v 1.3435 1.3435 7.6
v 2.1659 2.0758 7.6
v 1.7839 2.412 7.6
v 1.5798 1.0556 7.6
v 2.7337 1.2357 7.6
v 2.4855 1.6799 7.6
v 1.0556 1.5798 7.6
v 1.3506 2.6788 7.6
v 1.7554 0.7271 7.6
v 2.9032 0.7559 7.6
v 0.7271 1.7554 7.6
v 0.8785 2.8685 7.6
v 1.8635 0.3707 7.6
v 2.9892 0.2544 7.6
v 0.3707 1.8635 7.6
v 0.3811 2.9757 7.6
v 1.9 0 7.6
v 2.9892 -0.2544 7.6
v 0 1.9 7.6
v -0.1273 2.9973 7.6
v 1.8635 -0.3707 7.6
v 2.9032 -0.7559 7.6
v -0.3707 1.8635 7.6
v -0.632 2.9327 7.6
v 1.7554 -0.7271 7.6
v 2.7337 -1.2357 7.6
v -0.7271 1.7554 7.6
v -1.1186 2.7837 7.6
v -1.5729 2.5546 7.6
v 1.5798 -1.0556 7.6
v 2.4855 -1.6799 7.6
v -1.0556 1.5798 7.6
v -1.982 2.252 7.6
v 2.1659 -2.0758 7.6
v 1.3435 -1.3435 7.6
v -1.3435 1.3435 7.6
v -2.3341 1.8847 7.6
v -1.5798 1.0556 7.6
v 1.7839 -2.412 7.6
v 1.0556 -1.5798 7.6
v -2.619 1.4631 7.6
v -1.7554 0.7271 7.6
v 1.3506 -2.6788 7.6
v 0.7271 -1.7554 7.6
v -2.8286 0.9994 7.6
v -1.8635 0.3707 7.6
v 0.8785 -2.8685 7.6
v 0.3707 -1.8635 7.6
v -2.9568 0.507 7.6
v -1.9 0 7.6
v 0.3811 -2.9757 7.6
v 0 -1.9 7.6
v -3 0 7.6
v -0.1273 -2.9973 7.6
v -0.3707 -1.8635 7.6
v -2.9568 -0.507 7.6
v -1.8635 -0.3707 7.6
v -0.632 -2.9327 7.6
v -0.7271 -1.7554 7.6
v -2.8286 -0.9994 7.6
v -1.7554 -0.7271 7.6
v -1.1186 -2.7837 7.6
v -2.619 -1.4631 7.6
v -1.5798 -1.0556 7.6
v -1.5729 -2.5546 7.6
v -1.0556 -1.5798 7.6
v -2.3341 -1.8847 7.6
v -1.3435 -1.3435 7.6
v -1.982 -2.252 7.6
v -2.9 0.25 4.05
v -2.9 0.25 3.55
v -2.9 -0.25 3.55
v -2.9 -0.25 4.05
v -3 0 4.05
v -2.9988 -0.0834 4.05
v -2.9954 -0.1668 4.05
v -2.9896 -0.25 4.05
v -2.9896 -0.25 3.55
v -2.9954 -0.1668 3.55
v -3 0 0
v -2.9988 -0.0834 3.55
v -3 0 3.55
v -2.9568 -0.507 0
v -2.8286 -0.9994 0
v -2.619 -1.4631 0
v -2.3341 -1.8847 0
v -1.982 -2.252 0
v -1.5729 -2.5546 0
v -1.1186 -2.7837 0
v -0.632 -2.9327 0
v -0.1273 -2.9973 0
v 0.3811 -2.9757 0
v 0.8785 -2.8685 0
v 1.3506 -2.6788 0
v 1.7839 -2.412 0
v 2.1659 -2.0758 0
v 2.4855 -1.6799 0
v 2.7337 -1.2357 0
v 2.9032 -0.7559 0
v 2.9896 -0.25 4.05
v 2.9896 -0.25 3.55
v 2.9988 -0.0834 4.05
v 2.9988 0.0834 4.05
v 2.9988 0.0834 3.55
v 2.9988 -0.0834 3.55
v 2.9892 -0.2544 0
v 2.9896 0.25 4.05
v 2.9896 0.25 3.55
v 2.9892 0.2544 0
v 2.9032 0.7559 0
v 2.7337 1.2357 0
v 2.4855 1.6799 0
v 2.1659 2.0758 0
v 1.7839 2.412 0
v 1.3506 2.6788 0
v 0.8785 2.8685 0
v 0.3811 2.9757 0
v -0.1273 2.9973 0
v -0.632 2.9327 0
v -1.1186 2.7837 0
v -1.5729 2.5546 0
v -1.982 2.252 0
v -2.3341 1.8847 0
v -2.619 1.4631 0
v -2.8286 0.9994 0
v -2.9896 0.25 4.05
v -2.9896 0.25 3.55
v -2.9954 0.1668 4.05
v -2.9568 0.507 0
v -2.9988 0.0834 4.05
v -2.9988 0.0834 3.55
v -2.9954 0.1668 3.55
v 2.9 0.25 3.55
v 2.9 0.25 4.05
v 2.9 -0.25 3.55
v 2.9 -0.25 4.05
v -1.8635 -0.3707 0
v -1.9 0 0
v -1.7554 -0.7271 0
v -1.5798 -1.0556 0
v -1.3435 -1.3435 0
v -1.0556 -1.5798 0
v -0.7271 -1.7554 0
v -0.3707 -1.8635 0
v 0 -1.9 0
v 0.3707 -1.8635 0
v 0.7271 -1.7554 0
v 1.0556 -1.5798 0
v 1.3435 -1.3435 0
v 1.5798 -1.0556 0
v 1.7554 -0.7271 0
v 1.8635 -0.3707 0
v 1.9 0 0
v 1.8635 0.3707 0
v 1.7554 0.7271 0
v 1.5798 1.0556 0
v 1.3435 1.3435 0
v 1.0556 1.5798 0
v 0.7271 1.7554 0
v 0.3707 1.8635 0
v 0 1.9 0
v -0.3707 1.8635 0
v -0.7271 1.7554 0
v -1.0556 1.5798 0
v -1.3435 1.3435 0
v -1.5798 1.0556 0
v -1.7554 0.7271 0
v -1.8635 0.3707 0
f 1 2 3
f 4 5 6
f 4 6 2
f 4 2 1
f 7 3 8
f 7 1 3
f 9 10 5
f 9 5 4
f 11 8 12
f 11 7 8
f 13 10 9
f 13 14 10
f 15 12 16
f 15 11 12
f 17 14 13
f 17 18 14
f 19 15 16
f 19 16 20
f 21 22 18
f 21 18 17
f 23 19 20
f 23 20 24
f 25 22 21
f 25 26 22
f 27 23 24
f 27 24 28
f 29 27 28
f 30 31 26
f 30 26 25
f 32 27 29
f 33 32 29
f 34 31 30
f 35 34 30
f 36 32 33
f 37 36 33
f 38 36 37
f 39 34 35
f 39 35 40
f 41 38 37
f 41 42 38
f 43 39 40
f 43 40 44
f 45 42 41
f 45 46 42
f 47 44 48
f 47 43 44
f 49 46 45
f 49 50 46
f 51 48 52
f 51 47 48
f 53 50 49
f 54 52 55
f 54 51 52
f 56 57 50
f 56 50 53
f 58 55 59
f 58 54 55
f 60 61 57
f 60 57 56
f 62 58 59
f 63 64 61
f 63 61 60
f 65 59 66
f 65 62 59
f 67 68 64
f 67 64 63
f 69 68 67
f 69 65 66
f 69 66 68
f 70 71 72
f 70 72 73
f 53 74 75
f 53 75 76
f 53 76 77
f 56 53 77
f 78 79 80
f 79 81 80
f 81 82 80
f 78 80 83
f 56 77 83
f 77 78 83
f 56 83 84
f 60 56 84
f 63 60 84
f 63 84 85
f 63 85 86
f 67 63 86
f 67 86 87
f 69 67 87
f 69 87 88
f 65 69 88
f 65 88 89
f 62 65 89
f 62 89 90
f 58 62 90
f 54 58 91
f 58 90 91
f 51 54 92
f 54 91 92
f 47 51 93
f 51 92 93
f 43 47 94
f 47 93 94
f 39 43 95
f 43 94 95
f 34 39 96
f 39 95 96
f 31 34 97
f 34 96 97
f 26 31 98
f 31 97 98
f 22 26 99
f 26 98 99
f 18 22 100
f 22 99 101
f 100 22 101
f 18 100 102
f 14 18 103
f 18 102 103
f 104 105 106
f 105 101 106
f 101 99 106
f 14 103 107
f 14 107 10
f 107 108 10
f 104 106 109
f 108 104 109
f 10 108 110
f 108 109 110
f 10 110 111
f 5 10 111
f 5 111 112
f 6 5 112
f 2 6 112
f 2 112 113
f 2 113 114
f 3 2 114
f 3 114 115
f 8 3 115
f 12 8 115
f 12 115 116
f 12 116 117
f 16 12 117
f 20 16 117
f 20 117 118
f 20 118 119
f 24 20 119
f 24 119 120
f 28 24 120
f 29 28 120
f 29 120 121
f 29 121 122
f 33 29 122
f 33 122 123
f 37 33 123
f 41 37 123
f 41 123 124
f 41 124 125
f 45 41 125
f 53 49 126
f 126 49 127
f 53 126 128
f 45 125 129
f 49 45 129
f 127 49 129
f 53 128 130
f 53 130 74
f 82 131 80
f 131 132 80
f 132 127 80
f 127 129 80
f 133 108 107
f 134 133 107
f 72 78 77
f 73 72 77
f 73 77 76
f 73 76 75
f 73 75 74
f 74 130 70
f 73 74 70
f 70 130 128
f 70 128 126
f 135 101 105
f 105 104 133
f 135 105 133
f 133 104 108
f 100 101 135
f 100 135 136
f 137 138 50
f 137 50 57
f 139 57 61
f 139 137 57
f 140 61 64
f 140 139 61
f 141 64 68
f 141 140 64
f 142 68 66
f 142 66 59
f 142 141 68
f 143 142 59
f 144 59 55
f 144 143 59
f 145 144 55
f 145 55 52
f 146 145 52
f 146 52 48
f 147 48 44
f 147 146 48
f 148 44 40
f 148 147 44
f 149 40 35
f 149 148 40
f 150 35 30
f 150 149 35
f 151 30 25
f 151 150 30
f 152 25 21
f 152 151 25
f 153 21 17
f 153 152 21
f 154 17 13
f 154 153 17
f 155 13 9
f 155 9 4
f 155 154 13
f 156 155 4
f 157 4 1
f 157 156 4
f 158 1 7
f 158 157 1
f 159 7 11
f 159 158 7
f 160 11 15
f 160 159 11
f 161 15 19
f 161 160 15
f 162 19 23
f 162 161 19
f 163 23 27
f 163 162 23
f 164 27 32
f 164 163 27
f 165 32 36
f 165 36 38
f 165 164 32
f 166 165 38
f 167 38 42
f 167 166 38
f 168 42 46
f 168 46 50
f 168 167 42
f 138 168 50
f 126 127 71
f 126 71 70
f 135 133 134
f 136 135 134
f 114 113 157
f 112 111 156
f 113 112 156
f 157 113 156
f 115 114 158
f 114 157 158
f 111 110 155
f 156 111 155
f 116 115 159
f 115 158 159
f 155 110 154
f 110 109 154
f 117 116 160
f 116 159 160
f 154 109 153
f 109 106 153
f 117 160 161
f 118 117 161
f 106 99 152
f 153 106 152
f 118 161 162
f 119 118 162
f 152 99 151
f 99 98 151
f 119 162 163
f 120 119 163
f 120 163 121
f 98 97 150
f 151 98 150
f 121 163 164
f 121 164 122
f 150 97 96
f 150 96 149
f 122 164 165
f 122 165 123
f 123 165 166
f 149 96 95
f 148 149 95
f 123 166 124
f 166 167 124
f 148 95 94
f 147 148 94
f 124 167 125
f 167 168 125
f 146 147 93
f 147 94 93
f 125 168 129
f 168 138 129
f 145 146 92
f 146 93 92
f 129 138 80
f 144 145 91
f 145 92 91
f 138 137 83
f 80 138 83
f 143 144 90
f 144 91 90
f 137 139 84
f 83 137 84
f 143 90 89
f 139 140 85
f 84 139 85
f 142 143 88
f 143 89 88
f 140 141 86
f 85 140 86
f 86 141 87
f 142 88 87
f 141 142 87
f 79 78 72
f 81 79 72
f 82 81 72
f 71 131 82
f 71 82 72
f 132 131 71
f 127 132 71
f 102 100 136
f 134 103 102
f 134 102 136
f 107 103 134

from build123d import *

# Parameters (mm, degrees)
CROQUIS1_R              = 3
CROQUIS1_R_2            = 1.9
SALIENTE_EXTRUIR1_DEPTH = 7.6
CROQUIS3_W              = 0.5
CROQUIS3_H              = 0.5
CORTAR_EXTRUIR1_DEPTH   = 0.1


with BuildPart() as part:
    # Croquis1 → Saliente-Extruir1 (new body)
    with BuildSketch(Plane.XY):
        with Locations(Location((0, 0, 0), (0, 0, 180))):
            Circle(CROQUIS1_R)
        with Locations(Location((0, 0, 0), (0, 0, 180))):
            Circle(CROQUIS1_R_2, mode=Mode.SUBTRACT)
    extrude(amount=SALIENTE_EXTRUIR1_DEPTH)

    # Croquis3 → Cortar-Extruir1 (cut)
    with BuildSketch(Plane.ZY.offset(3)):
        with Locations((3.8, 0)):
            Rectangle(CROQUIS3_W, CROQUIS3_H)
    cortar_extruir1 = extrude(amount=-CORTAR_EXTRUIR1_DEPTH, mode=Mode.SUBTRACT)

    # Simetría1: Cortar-Extruir1 across plane
    add(cortar_extruir1.mirror(Plane(origin=(0, 0, 0), x_dir=(0, 0, 1), z_dir=(1, 0, 0))), mode=Mode.SUBTRACT)


solid = part.part
